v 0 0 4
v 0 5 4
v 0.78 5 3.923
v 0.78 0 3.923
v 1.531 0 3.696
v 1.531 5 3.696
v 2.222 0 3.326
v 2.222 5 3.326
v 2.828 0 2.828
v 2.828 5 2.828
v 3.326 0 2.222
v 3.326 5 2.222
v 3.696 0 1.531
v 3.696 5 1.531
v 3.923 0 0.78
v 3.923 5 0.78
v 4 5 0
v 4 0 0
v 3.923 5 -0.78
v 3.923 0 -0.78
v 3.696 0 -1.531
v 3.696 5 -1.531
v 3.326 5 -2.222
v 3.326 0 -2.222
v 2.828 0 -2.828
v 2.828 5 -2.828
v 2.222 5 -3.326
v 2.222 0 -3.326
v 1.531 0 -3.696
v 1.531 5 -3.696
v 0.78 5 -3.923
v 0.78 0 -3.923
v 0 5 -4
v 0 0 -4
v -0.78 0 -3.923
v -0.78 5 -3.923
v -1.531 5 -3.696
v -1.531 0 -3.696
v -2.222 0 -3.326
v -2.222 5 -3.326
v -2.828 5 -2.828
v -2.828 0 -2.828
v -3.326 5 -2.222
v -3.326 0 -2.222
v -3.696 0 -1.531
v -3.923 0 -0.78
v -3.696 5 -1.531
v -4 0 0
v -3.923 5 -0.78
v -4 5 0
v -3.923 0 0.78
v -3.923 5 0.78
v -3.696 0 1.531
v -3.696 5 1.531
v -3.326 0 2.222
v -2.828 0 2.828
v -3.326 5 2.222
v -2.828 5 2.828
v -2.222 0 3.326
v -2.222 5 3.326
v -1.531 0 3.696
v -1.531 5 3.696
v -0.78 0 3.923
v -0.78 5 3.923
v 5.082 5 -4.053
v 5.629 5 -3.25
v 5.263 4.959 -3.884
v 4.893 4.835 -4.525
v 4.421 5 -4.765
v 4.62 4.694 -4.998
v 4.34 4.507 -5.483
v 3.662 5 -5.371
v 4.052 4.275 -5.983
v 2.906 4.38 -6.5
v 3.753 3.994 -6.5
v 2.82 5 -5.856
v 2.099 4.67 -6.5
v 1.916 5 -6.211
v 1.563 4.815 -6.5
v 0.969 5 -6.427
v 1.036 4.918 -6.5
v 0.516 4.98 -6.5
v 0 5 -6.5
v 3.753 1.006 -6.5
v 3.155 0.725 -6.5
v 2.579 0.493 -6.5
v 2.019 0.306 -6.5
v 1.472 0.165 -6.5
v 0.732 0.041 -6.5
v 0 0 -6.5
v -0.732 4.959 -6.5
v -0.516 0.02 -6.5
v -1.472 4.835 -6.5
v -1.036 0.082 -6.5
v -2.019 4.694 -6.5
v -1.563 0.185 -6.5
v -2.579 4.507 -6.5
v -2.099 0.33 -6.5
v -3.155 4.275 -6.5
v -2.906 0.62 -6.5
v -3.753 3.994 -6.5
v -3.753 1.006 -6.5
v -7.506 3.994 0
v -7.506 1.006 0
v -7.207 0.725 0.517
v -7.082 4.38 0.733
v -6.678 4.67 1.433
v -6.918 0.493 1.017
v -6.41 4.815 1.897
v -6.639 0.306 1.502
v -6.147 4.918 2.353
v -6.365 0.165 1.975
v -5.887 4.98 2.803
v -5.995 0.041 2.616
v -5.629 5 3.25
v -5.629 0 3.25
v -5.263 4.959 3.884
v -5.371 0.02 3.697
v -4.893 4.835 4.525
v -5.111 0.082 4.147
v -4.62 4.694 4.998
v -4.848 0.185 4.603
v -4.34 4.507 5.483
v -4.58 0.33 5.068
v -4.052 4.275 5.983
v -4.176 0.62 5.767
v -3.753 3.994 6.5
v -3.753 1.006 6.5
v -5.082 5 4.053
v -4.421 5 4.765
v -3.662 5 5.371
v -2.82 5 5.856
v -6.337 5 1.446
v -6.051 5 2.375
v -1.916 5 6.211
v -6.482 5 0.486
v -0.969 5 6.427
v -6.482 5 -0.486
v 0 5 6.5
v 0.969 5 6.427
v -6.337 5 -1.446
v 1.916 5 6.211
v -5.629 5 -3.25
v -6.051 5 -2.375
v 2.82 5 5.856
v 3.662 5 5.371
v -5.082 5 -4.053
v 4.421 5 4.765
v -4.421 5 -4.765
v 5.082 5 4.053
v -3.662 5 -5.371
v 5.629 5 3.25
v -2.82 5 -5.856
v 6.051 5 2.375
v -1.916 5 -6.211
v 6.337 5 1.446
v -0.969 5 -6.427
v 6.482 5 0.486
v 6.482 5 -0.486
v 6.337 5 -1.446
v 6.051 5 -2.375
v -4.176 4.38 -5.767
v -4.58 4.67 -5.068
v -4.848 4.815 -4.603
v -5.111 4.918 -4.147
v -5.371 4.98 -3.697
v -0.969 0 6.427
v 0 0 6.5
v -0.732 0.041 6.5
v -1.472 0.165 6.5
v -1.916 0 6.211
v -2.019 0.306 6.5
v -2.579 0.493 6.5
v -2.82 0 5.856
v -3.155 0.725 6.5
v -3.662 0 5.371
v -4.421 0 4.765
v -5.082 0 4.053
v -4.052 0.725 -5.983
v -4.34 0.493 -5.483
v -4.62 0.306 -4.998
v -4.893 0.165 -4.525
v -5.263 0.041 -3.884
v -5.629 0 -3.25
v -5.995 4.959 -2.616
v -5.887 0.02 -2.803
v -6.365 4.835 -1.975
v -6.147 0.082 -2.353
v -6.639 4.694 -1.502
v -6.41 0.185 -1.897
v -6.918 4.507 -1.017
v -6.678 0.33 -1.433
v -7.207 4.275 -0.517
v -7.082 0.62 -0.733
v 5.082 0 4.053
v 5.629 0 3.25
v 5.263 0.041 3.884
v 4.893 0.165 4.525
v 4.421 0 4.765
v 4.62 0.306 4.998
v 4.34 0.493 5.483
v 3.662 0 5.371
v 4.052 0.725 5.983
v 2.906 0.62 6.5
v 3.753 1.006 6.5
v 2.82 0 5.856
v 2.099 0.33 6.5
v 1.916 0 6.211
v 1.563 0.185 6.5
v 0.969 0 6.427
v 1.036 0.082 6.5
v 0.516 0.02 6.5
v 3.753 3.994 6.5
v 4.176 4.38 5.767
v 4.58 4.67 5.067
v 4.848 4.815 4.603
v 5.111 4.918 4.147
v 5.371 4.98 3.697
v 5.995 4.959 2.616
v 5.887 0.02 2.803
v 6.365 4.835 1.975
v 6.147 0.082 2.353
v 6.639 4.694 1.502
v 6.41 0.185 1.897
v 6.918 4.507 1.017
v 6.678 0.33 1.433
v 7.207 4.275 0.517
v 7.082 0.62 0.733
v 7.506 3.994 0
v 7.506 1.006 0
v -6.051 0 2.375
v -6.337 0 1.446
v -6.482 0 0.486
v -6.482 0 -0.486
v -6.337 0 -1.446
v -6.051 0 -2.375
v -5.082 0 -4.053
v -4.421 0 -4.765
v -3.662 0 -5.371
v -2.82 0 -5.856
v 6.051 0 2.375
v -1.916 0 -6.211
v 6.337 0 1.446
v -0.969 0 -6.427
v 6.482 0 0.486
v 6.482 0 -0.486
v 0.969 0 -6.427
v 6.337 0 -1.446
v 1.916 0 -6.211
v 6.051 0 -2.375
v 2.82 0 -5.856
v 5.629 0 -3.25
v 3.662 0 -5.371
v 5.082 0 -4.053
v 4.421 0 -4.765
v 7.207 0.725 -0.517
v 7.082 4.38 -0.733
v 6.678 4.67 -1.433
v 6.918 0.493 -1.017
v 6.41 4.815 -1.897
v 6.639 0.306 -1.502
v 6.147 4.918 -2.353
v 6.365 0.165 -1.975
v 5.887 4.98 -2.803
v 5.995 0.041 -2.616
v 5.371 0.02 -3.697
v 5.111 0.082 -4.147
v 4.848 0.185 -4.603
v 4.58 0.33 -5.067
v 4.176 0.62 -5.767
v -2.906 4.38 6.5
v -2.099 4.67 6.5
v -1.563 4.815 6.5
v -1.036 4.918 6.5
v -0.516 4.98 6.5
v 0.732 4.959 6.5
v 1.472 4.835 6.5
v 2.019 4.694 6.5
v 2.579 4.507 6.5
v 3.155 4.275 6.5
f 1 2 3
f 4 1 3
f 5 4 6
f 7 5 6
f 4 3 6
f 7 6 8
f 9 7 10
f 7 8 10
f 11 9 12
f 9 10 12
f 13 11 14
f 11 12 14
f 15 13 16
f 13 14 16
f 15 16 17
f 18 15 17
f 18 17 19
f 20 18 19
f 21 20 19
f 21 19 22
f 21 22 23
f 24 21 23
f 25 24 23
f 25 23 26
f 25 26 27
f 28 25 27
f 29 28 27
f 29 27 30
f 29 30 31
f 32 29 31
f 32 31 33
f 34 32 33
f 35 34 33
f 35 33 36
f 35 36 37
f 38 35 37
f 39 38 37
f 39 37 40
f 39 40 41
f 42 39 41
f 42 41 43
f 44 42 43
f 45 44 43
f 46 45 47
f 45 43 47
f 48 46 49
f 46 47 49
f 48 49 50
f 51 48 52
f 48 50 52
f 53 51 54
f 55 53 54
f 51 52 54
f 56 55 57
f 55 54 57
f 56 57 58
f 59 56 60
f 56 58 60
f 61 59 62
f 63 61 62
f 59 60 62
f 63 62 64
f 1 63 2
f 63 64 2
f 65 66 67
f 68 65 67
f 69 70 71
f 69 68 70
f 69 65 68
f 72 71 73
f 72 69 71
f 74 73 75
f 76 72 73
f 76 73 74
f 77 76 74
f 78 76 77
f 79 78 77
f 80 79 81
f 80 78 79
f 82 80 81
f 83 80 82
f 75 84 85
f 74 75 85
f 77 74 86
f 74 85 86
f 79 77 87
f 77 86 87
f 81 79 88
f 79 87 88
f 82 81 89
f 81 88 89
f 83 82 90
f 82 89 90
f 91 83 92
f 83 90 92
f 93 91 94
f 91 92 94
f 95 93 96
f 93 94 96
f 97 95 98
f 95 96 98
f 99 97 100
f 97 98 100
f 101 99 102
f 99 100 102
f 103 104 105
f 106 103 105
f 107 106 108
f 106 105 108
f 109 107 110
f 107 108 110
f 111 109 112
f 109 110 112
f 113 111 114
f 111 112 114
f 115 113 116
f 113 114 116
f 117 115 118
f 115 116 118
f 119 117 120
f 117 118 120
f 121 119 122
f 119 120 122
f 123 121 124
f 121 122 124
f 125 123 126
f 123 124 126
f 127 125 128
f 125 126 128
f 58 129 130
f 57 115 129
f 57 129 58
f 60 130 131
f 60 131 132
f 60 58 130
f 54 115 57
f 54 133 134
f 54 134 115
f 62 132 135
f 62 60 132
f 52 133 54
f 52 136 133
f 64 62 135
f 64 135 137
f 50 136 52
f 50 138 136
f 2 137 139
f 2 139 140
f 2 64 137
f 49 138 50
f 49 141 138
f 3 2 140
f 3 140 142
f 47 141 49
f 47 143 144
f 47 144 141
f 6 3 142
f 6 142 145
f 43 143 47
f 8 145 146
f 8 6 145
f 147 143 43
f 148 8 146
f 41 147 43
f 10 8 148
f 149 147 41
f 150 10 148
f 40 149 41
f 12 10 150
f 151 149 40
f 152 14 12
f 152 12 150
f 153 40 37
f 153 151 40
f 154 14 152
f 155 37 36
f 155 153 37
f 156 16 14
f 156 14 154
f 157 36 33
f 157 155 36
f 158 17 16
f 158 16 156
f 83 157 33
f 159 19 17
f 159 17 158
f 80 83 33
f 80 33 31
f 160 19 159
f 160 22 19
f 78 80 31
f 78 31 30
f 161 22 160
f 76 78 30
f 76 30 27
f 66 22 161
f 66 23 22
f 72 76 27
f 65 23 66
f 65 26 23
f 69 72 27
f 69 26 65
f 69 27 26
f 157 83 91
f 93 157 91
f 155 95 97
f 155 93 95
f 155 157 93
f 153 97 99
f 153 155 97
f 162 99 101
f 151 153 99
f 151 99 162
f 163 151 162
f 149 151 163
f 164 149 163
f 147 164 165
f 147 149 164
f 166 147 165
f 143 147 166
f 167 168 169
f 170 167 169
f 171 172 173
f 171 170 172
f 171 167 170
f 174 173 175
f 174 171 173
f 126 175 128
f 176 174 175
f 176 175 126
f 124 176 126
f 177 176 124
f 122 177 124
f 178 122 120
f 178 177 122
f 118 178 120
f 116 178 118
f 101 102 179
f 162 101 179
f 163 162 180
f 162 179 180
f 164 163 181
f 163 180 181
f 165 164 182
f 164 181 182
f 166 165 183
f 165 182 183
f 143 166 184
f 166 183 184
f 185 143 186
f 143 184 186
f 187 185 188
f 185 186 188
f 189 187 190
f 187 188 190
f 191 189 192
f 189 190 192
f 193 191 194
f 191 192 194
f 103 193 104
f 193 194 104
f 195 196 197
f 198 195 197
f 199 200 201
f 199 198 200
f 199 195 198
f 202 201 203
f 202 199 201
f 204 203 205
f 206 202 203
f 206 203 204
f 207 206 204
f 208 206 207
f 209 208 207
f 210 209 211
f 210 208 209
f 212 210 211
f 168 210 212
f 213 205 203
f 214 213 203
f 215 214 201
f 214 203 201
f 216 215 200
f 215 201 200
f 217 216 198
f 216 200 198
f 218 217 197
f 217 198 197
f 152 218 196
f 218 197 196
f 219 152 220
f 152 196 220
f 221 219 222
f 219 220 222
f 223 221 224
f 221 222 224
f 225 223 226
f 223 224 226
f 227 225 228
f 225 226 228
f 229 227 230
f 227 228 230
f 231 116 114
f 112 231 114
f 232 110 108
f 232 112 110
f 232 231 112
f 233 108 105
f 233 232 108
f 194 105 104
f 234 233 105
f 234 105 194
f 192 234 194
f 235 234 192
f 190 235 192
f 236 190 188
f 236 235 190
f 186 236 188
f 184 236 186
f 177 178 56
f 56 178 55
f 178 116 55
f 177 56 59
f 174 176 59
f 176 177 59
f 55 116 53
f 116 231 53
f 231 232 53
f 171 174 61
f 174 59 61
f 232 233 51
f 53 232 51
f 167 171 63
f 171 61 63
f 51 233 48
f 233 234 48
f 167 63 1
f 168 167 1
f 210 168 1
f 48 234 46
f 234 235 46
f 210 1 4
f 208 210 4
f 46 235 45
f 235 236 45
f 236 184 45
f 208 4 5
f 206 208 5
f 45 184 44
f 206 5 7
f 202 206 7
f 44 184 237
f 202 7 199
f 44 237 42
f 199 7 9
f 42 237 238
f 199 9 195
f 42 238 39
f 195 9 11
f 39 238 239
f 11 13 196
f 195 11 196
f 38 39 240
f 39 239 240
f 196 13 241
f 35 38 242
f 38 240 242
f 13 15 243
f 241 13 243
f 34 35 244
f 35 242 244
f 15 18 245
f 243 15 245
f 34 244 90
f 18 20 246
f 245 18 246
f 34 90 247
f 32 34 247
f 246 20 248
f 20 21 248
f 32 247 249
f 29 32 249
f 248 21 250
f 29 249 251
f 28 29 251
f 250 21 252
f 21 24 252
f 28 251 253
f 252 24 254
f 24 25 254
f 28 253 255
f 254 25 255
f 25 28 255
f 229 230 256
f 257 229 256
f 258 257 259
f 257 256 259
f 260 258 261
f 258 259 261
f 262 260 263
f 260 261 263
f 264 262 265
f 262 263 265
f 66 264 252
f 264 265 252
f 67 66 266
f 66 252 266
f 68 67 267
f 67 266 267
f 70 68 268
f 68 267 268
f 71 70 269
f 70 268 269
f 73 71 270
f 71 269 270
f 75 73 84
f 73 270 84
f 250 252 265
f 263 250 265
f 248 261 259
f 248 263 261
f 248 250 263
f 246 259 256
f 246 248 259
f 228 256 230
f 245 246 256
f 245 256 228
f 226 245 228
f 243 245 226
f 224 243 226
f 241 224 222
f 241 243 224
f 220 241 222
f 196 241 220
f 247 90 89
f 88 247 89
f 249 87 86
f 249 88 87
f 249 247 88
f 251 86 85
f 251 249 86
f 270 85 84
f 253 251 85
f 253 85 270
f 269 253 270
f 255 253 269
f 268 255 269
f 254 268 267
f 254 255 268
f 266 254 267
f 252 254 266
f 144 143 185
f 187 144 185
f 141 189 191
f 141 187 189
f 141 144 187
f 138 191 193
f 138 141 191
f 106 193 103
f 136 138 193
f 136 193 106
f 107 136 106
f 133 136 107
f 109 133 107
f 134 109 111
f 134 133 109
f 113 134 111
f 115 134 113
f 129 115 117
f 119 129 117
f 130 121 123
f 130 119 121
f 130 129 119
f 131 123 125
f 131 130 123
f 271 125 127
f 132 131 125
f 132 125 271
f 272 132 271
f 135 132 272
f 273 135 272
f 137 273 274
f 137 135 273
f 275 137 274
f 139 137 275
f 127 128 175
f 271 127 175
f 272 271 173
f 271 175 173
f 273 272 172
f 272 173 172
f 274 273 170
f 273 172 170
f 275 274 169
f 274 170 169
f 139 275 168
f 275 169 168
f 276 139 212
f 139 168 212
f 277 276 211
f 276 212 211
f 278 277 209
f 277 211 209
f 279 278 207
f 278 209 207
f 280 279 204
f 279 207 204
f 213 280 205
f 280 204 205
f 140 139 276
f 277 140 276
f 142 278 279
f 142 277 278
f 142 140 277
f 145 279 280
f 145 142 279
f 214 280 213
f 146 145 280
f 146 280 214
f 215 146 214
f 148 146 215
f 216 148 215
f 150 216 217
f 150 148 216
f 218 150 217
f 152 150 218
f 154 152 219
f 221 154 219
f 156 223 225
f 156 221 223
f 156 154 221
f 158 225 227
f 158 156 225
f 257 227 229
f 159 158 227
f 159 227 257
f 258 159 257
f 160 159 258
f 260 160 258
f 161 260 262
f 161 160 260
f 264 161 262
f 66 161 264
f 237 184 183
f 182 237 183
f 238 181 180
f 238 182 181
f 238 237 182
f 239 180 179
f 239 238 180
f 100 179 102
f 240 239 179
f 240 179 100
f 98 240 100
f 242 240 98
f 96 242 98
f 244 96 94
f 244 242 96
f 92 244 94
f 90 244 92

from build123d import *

# Parameters (mm, degrees)
BOSS_EXTRUDE1_DEPTH     = 5
SKETCH2_OUTSIDE_W       = 45.342
SKETCH2_OUTSIDE_H       = 43.33
SKETCH2_OUTSIDE_R       = 6.5
CUT_EXTRUDE1_DEPTH      = 12.116804097
CUT_EXTRUDE1_DRAFT      = -45
MIRROR1_COPY_1_SKETCH_W = 45.342
MIRROR1_COPY_1_SKETCH_H = 43.33
MIRROR1_COPY_1_SKETCH_R = 6.5
MIRROR1_COPY_1_DEPTH    = 12.116804097
MIRROR1_COPY_1_DRAFT    = -45
SKETCH3_R               = 4
CUT_EXTRUDE2_DEPTH      = 12.116804097


with BuildPart() as part:
    # Sketch1 → Boss-Extrude1 (new body)
    with BuildSketch(Plane(origin=(0, 0, 0), x_dir=(1, 0, 0), z_dir=(0, 1, 0))):
        Polygon((7.505553499, 0), (3.75277675, 6.5), (-3.75277675, 6.5), (-7.505553499, 0), (-3.75277675, -6.5), (3.75277675, -6.5), align=None)
    extrude(amount=BOSS_EXTRUDE1_DEPTH)


with BuildPart() as cut_extrude1_tool:
    # Sketch2 outside → Cut-Extrude1 (with draft: the straight prism first)
    with BuildSketch(Plane(origin=(0, 5, 0), x_dir=(1, 0, 0), z_dir=(0, 1, 0))):
        Rectangle(SKETCH2_OUTSIDE_W, SKETCH2_OUTSIDE_H)
        Circle(SKETCH2_OUTSIDE_R, mode=Mode.SUBTRACT)
    extrude(amount=-CUT_EXTRUDE1_DEPTH)
    # Cut-Extrude1: the draft: its side faces are tilted about the plane it starts from
    cut_extrude1_sides = [cut_extrude1_tool.faces().sort_by_distance(p)[0] for p in [
        (0, -1.058402049, 21.665),
        (22.671, -1.058402049, 0),
        (0, -1.058402049, -21.665),
        (-22.671, -1.058402049, 0),
        (-6.5, -1.058402049, 0),
    ]]
    draft(cut_extrude1_sides, Plane(origin=(0, 5, 0), x_dir=(1, 0, 0), z_dir=(0, 1, 0)), CUT_EXTRUDE1_DRAFT)


with BuildPart() as part_1:
    add(part.part)

    # Cut-Extrude1: cut by cut_extrude1_tool
    add(cut_extrude1_tool.part, mode=Mode.SUBTRACT)


with BuildPart() as mirror1_copy_1_tool:
    # Mirror1 copy 1 sketch → Mirror1 copy 1 (with draft: the straight prism first)
    with BuildSketch(Plane.XZ):
        Rectangle(MIRROR1_COPY_1_SKETCH_W, MIRROR1_COPY_1_SKETCH_H)
        Circle(MIRROR1_COPY_1_SKETCH_R, mode=Mode.SUBTRACT)
    extrude(amount=-MIRROR1_COPY_1_DEPTH)
    # Mirror1 copy 1: the draft: its side faces are tilted about the plane it starts from
    mirror1_copy_1_sides = [mirror1_copy_1_tool.faces().sort_by_distance(p)[0] for p in [
        (0, 6.058402049, 21.665),
        (22.671, 6.058402049, 0),
        (0, 6.058402049, -21.665),
        (-22.671, 6.058402049, 0),
        (-6.5, 6.058402049, 0),
    ]]
    draft(mirror1_copy_1_sides, Plane.XZ, MIRROR1_COPY_1_DRAFT)


with BuildPart() as part_2:
    add(part_1.part)

    # Mirror1 copy 1: cut by mirror1_copy_1_tool
    add(mirror1_copy_1_tool.part, mode=Mode.SUBTRACT)

    # Sketch3 → Cut-Extrude2 (cut, through all)
    with BuildSketch(Plane(origin=(0, 5, 0), x_dir=(1, 0, 0), z_dir=(0, 1, 0))):
        with Locations(Location((0, 0, 0), (0, 0, 270))):
            Circle(SKETCH3_R)
    extrude(amount=-CUT_EXTRUDE2_DEPTH, mode=Mode.SUBTRACT)


solid = part_2.part
